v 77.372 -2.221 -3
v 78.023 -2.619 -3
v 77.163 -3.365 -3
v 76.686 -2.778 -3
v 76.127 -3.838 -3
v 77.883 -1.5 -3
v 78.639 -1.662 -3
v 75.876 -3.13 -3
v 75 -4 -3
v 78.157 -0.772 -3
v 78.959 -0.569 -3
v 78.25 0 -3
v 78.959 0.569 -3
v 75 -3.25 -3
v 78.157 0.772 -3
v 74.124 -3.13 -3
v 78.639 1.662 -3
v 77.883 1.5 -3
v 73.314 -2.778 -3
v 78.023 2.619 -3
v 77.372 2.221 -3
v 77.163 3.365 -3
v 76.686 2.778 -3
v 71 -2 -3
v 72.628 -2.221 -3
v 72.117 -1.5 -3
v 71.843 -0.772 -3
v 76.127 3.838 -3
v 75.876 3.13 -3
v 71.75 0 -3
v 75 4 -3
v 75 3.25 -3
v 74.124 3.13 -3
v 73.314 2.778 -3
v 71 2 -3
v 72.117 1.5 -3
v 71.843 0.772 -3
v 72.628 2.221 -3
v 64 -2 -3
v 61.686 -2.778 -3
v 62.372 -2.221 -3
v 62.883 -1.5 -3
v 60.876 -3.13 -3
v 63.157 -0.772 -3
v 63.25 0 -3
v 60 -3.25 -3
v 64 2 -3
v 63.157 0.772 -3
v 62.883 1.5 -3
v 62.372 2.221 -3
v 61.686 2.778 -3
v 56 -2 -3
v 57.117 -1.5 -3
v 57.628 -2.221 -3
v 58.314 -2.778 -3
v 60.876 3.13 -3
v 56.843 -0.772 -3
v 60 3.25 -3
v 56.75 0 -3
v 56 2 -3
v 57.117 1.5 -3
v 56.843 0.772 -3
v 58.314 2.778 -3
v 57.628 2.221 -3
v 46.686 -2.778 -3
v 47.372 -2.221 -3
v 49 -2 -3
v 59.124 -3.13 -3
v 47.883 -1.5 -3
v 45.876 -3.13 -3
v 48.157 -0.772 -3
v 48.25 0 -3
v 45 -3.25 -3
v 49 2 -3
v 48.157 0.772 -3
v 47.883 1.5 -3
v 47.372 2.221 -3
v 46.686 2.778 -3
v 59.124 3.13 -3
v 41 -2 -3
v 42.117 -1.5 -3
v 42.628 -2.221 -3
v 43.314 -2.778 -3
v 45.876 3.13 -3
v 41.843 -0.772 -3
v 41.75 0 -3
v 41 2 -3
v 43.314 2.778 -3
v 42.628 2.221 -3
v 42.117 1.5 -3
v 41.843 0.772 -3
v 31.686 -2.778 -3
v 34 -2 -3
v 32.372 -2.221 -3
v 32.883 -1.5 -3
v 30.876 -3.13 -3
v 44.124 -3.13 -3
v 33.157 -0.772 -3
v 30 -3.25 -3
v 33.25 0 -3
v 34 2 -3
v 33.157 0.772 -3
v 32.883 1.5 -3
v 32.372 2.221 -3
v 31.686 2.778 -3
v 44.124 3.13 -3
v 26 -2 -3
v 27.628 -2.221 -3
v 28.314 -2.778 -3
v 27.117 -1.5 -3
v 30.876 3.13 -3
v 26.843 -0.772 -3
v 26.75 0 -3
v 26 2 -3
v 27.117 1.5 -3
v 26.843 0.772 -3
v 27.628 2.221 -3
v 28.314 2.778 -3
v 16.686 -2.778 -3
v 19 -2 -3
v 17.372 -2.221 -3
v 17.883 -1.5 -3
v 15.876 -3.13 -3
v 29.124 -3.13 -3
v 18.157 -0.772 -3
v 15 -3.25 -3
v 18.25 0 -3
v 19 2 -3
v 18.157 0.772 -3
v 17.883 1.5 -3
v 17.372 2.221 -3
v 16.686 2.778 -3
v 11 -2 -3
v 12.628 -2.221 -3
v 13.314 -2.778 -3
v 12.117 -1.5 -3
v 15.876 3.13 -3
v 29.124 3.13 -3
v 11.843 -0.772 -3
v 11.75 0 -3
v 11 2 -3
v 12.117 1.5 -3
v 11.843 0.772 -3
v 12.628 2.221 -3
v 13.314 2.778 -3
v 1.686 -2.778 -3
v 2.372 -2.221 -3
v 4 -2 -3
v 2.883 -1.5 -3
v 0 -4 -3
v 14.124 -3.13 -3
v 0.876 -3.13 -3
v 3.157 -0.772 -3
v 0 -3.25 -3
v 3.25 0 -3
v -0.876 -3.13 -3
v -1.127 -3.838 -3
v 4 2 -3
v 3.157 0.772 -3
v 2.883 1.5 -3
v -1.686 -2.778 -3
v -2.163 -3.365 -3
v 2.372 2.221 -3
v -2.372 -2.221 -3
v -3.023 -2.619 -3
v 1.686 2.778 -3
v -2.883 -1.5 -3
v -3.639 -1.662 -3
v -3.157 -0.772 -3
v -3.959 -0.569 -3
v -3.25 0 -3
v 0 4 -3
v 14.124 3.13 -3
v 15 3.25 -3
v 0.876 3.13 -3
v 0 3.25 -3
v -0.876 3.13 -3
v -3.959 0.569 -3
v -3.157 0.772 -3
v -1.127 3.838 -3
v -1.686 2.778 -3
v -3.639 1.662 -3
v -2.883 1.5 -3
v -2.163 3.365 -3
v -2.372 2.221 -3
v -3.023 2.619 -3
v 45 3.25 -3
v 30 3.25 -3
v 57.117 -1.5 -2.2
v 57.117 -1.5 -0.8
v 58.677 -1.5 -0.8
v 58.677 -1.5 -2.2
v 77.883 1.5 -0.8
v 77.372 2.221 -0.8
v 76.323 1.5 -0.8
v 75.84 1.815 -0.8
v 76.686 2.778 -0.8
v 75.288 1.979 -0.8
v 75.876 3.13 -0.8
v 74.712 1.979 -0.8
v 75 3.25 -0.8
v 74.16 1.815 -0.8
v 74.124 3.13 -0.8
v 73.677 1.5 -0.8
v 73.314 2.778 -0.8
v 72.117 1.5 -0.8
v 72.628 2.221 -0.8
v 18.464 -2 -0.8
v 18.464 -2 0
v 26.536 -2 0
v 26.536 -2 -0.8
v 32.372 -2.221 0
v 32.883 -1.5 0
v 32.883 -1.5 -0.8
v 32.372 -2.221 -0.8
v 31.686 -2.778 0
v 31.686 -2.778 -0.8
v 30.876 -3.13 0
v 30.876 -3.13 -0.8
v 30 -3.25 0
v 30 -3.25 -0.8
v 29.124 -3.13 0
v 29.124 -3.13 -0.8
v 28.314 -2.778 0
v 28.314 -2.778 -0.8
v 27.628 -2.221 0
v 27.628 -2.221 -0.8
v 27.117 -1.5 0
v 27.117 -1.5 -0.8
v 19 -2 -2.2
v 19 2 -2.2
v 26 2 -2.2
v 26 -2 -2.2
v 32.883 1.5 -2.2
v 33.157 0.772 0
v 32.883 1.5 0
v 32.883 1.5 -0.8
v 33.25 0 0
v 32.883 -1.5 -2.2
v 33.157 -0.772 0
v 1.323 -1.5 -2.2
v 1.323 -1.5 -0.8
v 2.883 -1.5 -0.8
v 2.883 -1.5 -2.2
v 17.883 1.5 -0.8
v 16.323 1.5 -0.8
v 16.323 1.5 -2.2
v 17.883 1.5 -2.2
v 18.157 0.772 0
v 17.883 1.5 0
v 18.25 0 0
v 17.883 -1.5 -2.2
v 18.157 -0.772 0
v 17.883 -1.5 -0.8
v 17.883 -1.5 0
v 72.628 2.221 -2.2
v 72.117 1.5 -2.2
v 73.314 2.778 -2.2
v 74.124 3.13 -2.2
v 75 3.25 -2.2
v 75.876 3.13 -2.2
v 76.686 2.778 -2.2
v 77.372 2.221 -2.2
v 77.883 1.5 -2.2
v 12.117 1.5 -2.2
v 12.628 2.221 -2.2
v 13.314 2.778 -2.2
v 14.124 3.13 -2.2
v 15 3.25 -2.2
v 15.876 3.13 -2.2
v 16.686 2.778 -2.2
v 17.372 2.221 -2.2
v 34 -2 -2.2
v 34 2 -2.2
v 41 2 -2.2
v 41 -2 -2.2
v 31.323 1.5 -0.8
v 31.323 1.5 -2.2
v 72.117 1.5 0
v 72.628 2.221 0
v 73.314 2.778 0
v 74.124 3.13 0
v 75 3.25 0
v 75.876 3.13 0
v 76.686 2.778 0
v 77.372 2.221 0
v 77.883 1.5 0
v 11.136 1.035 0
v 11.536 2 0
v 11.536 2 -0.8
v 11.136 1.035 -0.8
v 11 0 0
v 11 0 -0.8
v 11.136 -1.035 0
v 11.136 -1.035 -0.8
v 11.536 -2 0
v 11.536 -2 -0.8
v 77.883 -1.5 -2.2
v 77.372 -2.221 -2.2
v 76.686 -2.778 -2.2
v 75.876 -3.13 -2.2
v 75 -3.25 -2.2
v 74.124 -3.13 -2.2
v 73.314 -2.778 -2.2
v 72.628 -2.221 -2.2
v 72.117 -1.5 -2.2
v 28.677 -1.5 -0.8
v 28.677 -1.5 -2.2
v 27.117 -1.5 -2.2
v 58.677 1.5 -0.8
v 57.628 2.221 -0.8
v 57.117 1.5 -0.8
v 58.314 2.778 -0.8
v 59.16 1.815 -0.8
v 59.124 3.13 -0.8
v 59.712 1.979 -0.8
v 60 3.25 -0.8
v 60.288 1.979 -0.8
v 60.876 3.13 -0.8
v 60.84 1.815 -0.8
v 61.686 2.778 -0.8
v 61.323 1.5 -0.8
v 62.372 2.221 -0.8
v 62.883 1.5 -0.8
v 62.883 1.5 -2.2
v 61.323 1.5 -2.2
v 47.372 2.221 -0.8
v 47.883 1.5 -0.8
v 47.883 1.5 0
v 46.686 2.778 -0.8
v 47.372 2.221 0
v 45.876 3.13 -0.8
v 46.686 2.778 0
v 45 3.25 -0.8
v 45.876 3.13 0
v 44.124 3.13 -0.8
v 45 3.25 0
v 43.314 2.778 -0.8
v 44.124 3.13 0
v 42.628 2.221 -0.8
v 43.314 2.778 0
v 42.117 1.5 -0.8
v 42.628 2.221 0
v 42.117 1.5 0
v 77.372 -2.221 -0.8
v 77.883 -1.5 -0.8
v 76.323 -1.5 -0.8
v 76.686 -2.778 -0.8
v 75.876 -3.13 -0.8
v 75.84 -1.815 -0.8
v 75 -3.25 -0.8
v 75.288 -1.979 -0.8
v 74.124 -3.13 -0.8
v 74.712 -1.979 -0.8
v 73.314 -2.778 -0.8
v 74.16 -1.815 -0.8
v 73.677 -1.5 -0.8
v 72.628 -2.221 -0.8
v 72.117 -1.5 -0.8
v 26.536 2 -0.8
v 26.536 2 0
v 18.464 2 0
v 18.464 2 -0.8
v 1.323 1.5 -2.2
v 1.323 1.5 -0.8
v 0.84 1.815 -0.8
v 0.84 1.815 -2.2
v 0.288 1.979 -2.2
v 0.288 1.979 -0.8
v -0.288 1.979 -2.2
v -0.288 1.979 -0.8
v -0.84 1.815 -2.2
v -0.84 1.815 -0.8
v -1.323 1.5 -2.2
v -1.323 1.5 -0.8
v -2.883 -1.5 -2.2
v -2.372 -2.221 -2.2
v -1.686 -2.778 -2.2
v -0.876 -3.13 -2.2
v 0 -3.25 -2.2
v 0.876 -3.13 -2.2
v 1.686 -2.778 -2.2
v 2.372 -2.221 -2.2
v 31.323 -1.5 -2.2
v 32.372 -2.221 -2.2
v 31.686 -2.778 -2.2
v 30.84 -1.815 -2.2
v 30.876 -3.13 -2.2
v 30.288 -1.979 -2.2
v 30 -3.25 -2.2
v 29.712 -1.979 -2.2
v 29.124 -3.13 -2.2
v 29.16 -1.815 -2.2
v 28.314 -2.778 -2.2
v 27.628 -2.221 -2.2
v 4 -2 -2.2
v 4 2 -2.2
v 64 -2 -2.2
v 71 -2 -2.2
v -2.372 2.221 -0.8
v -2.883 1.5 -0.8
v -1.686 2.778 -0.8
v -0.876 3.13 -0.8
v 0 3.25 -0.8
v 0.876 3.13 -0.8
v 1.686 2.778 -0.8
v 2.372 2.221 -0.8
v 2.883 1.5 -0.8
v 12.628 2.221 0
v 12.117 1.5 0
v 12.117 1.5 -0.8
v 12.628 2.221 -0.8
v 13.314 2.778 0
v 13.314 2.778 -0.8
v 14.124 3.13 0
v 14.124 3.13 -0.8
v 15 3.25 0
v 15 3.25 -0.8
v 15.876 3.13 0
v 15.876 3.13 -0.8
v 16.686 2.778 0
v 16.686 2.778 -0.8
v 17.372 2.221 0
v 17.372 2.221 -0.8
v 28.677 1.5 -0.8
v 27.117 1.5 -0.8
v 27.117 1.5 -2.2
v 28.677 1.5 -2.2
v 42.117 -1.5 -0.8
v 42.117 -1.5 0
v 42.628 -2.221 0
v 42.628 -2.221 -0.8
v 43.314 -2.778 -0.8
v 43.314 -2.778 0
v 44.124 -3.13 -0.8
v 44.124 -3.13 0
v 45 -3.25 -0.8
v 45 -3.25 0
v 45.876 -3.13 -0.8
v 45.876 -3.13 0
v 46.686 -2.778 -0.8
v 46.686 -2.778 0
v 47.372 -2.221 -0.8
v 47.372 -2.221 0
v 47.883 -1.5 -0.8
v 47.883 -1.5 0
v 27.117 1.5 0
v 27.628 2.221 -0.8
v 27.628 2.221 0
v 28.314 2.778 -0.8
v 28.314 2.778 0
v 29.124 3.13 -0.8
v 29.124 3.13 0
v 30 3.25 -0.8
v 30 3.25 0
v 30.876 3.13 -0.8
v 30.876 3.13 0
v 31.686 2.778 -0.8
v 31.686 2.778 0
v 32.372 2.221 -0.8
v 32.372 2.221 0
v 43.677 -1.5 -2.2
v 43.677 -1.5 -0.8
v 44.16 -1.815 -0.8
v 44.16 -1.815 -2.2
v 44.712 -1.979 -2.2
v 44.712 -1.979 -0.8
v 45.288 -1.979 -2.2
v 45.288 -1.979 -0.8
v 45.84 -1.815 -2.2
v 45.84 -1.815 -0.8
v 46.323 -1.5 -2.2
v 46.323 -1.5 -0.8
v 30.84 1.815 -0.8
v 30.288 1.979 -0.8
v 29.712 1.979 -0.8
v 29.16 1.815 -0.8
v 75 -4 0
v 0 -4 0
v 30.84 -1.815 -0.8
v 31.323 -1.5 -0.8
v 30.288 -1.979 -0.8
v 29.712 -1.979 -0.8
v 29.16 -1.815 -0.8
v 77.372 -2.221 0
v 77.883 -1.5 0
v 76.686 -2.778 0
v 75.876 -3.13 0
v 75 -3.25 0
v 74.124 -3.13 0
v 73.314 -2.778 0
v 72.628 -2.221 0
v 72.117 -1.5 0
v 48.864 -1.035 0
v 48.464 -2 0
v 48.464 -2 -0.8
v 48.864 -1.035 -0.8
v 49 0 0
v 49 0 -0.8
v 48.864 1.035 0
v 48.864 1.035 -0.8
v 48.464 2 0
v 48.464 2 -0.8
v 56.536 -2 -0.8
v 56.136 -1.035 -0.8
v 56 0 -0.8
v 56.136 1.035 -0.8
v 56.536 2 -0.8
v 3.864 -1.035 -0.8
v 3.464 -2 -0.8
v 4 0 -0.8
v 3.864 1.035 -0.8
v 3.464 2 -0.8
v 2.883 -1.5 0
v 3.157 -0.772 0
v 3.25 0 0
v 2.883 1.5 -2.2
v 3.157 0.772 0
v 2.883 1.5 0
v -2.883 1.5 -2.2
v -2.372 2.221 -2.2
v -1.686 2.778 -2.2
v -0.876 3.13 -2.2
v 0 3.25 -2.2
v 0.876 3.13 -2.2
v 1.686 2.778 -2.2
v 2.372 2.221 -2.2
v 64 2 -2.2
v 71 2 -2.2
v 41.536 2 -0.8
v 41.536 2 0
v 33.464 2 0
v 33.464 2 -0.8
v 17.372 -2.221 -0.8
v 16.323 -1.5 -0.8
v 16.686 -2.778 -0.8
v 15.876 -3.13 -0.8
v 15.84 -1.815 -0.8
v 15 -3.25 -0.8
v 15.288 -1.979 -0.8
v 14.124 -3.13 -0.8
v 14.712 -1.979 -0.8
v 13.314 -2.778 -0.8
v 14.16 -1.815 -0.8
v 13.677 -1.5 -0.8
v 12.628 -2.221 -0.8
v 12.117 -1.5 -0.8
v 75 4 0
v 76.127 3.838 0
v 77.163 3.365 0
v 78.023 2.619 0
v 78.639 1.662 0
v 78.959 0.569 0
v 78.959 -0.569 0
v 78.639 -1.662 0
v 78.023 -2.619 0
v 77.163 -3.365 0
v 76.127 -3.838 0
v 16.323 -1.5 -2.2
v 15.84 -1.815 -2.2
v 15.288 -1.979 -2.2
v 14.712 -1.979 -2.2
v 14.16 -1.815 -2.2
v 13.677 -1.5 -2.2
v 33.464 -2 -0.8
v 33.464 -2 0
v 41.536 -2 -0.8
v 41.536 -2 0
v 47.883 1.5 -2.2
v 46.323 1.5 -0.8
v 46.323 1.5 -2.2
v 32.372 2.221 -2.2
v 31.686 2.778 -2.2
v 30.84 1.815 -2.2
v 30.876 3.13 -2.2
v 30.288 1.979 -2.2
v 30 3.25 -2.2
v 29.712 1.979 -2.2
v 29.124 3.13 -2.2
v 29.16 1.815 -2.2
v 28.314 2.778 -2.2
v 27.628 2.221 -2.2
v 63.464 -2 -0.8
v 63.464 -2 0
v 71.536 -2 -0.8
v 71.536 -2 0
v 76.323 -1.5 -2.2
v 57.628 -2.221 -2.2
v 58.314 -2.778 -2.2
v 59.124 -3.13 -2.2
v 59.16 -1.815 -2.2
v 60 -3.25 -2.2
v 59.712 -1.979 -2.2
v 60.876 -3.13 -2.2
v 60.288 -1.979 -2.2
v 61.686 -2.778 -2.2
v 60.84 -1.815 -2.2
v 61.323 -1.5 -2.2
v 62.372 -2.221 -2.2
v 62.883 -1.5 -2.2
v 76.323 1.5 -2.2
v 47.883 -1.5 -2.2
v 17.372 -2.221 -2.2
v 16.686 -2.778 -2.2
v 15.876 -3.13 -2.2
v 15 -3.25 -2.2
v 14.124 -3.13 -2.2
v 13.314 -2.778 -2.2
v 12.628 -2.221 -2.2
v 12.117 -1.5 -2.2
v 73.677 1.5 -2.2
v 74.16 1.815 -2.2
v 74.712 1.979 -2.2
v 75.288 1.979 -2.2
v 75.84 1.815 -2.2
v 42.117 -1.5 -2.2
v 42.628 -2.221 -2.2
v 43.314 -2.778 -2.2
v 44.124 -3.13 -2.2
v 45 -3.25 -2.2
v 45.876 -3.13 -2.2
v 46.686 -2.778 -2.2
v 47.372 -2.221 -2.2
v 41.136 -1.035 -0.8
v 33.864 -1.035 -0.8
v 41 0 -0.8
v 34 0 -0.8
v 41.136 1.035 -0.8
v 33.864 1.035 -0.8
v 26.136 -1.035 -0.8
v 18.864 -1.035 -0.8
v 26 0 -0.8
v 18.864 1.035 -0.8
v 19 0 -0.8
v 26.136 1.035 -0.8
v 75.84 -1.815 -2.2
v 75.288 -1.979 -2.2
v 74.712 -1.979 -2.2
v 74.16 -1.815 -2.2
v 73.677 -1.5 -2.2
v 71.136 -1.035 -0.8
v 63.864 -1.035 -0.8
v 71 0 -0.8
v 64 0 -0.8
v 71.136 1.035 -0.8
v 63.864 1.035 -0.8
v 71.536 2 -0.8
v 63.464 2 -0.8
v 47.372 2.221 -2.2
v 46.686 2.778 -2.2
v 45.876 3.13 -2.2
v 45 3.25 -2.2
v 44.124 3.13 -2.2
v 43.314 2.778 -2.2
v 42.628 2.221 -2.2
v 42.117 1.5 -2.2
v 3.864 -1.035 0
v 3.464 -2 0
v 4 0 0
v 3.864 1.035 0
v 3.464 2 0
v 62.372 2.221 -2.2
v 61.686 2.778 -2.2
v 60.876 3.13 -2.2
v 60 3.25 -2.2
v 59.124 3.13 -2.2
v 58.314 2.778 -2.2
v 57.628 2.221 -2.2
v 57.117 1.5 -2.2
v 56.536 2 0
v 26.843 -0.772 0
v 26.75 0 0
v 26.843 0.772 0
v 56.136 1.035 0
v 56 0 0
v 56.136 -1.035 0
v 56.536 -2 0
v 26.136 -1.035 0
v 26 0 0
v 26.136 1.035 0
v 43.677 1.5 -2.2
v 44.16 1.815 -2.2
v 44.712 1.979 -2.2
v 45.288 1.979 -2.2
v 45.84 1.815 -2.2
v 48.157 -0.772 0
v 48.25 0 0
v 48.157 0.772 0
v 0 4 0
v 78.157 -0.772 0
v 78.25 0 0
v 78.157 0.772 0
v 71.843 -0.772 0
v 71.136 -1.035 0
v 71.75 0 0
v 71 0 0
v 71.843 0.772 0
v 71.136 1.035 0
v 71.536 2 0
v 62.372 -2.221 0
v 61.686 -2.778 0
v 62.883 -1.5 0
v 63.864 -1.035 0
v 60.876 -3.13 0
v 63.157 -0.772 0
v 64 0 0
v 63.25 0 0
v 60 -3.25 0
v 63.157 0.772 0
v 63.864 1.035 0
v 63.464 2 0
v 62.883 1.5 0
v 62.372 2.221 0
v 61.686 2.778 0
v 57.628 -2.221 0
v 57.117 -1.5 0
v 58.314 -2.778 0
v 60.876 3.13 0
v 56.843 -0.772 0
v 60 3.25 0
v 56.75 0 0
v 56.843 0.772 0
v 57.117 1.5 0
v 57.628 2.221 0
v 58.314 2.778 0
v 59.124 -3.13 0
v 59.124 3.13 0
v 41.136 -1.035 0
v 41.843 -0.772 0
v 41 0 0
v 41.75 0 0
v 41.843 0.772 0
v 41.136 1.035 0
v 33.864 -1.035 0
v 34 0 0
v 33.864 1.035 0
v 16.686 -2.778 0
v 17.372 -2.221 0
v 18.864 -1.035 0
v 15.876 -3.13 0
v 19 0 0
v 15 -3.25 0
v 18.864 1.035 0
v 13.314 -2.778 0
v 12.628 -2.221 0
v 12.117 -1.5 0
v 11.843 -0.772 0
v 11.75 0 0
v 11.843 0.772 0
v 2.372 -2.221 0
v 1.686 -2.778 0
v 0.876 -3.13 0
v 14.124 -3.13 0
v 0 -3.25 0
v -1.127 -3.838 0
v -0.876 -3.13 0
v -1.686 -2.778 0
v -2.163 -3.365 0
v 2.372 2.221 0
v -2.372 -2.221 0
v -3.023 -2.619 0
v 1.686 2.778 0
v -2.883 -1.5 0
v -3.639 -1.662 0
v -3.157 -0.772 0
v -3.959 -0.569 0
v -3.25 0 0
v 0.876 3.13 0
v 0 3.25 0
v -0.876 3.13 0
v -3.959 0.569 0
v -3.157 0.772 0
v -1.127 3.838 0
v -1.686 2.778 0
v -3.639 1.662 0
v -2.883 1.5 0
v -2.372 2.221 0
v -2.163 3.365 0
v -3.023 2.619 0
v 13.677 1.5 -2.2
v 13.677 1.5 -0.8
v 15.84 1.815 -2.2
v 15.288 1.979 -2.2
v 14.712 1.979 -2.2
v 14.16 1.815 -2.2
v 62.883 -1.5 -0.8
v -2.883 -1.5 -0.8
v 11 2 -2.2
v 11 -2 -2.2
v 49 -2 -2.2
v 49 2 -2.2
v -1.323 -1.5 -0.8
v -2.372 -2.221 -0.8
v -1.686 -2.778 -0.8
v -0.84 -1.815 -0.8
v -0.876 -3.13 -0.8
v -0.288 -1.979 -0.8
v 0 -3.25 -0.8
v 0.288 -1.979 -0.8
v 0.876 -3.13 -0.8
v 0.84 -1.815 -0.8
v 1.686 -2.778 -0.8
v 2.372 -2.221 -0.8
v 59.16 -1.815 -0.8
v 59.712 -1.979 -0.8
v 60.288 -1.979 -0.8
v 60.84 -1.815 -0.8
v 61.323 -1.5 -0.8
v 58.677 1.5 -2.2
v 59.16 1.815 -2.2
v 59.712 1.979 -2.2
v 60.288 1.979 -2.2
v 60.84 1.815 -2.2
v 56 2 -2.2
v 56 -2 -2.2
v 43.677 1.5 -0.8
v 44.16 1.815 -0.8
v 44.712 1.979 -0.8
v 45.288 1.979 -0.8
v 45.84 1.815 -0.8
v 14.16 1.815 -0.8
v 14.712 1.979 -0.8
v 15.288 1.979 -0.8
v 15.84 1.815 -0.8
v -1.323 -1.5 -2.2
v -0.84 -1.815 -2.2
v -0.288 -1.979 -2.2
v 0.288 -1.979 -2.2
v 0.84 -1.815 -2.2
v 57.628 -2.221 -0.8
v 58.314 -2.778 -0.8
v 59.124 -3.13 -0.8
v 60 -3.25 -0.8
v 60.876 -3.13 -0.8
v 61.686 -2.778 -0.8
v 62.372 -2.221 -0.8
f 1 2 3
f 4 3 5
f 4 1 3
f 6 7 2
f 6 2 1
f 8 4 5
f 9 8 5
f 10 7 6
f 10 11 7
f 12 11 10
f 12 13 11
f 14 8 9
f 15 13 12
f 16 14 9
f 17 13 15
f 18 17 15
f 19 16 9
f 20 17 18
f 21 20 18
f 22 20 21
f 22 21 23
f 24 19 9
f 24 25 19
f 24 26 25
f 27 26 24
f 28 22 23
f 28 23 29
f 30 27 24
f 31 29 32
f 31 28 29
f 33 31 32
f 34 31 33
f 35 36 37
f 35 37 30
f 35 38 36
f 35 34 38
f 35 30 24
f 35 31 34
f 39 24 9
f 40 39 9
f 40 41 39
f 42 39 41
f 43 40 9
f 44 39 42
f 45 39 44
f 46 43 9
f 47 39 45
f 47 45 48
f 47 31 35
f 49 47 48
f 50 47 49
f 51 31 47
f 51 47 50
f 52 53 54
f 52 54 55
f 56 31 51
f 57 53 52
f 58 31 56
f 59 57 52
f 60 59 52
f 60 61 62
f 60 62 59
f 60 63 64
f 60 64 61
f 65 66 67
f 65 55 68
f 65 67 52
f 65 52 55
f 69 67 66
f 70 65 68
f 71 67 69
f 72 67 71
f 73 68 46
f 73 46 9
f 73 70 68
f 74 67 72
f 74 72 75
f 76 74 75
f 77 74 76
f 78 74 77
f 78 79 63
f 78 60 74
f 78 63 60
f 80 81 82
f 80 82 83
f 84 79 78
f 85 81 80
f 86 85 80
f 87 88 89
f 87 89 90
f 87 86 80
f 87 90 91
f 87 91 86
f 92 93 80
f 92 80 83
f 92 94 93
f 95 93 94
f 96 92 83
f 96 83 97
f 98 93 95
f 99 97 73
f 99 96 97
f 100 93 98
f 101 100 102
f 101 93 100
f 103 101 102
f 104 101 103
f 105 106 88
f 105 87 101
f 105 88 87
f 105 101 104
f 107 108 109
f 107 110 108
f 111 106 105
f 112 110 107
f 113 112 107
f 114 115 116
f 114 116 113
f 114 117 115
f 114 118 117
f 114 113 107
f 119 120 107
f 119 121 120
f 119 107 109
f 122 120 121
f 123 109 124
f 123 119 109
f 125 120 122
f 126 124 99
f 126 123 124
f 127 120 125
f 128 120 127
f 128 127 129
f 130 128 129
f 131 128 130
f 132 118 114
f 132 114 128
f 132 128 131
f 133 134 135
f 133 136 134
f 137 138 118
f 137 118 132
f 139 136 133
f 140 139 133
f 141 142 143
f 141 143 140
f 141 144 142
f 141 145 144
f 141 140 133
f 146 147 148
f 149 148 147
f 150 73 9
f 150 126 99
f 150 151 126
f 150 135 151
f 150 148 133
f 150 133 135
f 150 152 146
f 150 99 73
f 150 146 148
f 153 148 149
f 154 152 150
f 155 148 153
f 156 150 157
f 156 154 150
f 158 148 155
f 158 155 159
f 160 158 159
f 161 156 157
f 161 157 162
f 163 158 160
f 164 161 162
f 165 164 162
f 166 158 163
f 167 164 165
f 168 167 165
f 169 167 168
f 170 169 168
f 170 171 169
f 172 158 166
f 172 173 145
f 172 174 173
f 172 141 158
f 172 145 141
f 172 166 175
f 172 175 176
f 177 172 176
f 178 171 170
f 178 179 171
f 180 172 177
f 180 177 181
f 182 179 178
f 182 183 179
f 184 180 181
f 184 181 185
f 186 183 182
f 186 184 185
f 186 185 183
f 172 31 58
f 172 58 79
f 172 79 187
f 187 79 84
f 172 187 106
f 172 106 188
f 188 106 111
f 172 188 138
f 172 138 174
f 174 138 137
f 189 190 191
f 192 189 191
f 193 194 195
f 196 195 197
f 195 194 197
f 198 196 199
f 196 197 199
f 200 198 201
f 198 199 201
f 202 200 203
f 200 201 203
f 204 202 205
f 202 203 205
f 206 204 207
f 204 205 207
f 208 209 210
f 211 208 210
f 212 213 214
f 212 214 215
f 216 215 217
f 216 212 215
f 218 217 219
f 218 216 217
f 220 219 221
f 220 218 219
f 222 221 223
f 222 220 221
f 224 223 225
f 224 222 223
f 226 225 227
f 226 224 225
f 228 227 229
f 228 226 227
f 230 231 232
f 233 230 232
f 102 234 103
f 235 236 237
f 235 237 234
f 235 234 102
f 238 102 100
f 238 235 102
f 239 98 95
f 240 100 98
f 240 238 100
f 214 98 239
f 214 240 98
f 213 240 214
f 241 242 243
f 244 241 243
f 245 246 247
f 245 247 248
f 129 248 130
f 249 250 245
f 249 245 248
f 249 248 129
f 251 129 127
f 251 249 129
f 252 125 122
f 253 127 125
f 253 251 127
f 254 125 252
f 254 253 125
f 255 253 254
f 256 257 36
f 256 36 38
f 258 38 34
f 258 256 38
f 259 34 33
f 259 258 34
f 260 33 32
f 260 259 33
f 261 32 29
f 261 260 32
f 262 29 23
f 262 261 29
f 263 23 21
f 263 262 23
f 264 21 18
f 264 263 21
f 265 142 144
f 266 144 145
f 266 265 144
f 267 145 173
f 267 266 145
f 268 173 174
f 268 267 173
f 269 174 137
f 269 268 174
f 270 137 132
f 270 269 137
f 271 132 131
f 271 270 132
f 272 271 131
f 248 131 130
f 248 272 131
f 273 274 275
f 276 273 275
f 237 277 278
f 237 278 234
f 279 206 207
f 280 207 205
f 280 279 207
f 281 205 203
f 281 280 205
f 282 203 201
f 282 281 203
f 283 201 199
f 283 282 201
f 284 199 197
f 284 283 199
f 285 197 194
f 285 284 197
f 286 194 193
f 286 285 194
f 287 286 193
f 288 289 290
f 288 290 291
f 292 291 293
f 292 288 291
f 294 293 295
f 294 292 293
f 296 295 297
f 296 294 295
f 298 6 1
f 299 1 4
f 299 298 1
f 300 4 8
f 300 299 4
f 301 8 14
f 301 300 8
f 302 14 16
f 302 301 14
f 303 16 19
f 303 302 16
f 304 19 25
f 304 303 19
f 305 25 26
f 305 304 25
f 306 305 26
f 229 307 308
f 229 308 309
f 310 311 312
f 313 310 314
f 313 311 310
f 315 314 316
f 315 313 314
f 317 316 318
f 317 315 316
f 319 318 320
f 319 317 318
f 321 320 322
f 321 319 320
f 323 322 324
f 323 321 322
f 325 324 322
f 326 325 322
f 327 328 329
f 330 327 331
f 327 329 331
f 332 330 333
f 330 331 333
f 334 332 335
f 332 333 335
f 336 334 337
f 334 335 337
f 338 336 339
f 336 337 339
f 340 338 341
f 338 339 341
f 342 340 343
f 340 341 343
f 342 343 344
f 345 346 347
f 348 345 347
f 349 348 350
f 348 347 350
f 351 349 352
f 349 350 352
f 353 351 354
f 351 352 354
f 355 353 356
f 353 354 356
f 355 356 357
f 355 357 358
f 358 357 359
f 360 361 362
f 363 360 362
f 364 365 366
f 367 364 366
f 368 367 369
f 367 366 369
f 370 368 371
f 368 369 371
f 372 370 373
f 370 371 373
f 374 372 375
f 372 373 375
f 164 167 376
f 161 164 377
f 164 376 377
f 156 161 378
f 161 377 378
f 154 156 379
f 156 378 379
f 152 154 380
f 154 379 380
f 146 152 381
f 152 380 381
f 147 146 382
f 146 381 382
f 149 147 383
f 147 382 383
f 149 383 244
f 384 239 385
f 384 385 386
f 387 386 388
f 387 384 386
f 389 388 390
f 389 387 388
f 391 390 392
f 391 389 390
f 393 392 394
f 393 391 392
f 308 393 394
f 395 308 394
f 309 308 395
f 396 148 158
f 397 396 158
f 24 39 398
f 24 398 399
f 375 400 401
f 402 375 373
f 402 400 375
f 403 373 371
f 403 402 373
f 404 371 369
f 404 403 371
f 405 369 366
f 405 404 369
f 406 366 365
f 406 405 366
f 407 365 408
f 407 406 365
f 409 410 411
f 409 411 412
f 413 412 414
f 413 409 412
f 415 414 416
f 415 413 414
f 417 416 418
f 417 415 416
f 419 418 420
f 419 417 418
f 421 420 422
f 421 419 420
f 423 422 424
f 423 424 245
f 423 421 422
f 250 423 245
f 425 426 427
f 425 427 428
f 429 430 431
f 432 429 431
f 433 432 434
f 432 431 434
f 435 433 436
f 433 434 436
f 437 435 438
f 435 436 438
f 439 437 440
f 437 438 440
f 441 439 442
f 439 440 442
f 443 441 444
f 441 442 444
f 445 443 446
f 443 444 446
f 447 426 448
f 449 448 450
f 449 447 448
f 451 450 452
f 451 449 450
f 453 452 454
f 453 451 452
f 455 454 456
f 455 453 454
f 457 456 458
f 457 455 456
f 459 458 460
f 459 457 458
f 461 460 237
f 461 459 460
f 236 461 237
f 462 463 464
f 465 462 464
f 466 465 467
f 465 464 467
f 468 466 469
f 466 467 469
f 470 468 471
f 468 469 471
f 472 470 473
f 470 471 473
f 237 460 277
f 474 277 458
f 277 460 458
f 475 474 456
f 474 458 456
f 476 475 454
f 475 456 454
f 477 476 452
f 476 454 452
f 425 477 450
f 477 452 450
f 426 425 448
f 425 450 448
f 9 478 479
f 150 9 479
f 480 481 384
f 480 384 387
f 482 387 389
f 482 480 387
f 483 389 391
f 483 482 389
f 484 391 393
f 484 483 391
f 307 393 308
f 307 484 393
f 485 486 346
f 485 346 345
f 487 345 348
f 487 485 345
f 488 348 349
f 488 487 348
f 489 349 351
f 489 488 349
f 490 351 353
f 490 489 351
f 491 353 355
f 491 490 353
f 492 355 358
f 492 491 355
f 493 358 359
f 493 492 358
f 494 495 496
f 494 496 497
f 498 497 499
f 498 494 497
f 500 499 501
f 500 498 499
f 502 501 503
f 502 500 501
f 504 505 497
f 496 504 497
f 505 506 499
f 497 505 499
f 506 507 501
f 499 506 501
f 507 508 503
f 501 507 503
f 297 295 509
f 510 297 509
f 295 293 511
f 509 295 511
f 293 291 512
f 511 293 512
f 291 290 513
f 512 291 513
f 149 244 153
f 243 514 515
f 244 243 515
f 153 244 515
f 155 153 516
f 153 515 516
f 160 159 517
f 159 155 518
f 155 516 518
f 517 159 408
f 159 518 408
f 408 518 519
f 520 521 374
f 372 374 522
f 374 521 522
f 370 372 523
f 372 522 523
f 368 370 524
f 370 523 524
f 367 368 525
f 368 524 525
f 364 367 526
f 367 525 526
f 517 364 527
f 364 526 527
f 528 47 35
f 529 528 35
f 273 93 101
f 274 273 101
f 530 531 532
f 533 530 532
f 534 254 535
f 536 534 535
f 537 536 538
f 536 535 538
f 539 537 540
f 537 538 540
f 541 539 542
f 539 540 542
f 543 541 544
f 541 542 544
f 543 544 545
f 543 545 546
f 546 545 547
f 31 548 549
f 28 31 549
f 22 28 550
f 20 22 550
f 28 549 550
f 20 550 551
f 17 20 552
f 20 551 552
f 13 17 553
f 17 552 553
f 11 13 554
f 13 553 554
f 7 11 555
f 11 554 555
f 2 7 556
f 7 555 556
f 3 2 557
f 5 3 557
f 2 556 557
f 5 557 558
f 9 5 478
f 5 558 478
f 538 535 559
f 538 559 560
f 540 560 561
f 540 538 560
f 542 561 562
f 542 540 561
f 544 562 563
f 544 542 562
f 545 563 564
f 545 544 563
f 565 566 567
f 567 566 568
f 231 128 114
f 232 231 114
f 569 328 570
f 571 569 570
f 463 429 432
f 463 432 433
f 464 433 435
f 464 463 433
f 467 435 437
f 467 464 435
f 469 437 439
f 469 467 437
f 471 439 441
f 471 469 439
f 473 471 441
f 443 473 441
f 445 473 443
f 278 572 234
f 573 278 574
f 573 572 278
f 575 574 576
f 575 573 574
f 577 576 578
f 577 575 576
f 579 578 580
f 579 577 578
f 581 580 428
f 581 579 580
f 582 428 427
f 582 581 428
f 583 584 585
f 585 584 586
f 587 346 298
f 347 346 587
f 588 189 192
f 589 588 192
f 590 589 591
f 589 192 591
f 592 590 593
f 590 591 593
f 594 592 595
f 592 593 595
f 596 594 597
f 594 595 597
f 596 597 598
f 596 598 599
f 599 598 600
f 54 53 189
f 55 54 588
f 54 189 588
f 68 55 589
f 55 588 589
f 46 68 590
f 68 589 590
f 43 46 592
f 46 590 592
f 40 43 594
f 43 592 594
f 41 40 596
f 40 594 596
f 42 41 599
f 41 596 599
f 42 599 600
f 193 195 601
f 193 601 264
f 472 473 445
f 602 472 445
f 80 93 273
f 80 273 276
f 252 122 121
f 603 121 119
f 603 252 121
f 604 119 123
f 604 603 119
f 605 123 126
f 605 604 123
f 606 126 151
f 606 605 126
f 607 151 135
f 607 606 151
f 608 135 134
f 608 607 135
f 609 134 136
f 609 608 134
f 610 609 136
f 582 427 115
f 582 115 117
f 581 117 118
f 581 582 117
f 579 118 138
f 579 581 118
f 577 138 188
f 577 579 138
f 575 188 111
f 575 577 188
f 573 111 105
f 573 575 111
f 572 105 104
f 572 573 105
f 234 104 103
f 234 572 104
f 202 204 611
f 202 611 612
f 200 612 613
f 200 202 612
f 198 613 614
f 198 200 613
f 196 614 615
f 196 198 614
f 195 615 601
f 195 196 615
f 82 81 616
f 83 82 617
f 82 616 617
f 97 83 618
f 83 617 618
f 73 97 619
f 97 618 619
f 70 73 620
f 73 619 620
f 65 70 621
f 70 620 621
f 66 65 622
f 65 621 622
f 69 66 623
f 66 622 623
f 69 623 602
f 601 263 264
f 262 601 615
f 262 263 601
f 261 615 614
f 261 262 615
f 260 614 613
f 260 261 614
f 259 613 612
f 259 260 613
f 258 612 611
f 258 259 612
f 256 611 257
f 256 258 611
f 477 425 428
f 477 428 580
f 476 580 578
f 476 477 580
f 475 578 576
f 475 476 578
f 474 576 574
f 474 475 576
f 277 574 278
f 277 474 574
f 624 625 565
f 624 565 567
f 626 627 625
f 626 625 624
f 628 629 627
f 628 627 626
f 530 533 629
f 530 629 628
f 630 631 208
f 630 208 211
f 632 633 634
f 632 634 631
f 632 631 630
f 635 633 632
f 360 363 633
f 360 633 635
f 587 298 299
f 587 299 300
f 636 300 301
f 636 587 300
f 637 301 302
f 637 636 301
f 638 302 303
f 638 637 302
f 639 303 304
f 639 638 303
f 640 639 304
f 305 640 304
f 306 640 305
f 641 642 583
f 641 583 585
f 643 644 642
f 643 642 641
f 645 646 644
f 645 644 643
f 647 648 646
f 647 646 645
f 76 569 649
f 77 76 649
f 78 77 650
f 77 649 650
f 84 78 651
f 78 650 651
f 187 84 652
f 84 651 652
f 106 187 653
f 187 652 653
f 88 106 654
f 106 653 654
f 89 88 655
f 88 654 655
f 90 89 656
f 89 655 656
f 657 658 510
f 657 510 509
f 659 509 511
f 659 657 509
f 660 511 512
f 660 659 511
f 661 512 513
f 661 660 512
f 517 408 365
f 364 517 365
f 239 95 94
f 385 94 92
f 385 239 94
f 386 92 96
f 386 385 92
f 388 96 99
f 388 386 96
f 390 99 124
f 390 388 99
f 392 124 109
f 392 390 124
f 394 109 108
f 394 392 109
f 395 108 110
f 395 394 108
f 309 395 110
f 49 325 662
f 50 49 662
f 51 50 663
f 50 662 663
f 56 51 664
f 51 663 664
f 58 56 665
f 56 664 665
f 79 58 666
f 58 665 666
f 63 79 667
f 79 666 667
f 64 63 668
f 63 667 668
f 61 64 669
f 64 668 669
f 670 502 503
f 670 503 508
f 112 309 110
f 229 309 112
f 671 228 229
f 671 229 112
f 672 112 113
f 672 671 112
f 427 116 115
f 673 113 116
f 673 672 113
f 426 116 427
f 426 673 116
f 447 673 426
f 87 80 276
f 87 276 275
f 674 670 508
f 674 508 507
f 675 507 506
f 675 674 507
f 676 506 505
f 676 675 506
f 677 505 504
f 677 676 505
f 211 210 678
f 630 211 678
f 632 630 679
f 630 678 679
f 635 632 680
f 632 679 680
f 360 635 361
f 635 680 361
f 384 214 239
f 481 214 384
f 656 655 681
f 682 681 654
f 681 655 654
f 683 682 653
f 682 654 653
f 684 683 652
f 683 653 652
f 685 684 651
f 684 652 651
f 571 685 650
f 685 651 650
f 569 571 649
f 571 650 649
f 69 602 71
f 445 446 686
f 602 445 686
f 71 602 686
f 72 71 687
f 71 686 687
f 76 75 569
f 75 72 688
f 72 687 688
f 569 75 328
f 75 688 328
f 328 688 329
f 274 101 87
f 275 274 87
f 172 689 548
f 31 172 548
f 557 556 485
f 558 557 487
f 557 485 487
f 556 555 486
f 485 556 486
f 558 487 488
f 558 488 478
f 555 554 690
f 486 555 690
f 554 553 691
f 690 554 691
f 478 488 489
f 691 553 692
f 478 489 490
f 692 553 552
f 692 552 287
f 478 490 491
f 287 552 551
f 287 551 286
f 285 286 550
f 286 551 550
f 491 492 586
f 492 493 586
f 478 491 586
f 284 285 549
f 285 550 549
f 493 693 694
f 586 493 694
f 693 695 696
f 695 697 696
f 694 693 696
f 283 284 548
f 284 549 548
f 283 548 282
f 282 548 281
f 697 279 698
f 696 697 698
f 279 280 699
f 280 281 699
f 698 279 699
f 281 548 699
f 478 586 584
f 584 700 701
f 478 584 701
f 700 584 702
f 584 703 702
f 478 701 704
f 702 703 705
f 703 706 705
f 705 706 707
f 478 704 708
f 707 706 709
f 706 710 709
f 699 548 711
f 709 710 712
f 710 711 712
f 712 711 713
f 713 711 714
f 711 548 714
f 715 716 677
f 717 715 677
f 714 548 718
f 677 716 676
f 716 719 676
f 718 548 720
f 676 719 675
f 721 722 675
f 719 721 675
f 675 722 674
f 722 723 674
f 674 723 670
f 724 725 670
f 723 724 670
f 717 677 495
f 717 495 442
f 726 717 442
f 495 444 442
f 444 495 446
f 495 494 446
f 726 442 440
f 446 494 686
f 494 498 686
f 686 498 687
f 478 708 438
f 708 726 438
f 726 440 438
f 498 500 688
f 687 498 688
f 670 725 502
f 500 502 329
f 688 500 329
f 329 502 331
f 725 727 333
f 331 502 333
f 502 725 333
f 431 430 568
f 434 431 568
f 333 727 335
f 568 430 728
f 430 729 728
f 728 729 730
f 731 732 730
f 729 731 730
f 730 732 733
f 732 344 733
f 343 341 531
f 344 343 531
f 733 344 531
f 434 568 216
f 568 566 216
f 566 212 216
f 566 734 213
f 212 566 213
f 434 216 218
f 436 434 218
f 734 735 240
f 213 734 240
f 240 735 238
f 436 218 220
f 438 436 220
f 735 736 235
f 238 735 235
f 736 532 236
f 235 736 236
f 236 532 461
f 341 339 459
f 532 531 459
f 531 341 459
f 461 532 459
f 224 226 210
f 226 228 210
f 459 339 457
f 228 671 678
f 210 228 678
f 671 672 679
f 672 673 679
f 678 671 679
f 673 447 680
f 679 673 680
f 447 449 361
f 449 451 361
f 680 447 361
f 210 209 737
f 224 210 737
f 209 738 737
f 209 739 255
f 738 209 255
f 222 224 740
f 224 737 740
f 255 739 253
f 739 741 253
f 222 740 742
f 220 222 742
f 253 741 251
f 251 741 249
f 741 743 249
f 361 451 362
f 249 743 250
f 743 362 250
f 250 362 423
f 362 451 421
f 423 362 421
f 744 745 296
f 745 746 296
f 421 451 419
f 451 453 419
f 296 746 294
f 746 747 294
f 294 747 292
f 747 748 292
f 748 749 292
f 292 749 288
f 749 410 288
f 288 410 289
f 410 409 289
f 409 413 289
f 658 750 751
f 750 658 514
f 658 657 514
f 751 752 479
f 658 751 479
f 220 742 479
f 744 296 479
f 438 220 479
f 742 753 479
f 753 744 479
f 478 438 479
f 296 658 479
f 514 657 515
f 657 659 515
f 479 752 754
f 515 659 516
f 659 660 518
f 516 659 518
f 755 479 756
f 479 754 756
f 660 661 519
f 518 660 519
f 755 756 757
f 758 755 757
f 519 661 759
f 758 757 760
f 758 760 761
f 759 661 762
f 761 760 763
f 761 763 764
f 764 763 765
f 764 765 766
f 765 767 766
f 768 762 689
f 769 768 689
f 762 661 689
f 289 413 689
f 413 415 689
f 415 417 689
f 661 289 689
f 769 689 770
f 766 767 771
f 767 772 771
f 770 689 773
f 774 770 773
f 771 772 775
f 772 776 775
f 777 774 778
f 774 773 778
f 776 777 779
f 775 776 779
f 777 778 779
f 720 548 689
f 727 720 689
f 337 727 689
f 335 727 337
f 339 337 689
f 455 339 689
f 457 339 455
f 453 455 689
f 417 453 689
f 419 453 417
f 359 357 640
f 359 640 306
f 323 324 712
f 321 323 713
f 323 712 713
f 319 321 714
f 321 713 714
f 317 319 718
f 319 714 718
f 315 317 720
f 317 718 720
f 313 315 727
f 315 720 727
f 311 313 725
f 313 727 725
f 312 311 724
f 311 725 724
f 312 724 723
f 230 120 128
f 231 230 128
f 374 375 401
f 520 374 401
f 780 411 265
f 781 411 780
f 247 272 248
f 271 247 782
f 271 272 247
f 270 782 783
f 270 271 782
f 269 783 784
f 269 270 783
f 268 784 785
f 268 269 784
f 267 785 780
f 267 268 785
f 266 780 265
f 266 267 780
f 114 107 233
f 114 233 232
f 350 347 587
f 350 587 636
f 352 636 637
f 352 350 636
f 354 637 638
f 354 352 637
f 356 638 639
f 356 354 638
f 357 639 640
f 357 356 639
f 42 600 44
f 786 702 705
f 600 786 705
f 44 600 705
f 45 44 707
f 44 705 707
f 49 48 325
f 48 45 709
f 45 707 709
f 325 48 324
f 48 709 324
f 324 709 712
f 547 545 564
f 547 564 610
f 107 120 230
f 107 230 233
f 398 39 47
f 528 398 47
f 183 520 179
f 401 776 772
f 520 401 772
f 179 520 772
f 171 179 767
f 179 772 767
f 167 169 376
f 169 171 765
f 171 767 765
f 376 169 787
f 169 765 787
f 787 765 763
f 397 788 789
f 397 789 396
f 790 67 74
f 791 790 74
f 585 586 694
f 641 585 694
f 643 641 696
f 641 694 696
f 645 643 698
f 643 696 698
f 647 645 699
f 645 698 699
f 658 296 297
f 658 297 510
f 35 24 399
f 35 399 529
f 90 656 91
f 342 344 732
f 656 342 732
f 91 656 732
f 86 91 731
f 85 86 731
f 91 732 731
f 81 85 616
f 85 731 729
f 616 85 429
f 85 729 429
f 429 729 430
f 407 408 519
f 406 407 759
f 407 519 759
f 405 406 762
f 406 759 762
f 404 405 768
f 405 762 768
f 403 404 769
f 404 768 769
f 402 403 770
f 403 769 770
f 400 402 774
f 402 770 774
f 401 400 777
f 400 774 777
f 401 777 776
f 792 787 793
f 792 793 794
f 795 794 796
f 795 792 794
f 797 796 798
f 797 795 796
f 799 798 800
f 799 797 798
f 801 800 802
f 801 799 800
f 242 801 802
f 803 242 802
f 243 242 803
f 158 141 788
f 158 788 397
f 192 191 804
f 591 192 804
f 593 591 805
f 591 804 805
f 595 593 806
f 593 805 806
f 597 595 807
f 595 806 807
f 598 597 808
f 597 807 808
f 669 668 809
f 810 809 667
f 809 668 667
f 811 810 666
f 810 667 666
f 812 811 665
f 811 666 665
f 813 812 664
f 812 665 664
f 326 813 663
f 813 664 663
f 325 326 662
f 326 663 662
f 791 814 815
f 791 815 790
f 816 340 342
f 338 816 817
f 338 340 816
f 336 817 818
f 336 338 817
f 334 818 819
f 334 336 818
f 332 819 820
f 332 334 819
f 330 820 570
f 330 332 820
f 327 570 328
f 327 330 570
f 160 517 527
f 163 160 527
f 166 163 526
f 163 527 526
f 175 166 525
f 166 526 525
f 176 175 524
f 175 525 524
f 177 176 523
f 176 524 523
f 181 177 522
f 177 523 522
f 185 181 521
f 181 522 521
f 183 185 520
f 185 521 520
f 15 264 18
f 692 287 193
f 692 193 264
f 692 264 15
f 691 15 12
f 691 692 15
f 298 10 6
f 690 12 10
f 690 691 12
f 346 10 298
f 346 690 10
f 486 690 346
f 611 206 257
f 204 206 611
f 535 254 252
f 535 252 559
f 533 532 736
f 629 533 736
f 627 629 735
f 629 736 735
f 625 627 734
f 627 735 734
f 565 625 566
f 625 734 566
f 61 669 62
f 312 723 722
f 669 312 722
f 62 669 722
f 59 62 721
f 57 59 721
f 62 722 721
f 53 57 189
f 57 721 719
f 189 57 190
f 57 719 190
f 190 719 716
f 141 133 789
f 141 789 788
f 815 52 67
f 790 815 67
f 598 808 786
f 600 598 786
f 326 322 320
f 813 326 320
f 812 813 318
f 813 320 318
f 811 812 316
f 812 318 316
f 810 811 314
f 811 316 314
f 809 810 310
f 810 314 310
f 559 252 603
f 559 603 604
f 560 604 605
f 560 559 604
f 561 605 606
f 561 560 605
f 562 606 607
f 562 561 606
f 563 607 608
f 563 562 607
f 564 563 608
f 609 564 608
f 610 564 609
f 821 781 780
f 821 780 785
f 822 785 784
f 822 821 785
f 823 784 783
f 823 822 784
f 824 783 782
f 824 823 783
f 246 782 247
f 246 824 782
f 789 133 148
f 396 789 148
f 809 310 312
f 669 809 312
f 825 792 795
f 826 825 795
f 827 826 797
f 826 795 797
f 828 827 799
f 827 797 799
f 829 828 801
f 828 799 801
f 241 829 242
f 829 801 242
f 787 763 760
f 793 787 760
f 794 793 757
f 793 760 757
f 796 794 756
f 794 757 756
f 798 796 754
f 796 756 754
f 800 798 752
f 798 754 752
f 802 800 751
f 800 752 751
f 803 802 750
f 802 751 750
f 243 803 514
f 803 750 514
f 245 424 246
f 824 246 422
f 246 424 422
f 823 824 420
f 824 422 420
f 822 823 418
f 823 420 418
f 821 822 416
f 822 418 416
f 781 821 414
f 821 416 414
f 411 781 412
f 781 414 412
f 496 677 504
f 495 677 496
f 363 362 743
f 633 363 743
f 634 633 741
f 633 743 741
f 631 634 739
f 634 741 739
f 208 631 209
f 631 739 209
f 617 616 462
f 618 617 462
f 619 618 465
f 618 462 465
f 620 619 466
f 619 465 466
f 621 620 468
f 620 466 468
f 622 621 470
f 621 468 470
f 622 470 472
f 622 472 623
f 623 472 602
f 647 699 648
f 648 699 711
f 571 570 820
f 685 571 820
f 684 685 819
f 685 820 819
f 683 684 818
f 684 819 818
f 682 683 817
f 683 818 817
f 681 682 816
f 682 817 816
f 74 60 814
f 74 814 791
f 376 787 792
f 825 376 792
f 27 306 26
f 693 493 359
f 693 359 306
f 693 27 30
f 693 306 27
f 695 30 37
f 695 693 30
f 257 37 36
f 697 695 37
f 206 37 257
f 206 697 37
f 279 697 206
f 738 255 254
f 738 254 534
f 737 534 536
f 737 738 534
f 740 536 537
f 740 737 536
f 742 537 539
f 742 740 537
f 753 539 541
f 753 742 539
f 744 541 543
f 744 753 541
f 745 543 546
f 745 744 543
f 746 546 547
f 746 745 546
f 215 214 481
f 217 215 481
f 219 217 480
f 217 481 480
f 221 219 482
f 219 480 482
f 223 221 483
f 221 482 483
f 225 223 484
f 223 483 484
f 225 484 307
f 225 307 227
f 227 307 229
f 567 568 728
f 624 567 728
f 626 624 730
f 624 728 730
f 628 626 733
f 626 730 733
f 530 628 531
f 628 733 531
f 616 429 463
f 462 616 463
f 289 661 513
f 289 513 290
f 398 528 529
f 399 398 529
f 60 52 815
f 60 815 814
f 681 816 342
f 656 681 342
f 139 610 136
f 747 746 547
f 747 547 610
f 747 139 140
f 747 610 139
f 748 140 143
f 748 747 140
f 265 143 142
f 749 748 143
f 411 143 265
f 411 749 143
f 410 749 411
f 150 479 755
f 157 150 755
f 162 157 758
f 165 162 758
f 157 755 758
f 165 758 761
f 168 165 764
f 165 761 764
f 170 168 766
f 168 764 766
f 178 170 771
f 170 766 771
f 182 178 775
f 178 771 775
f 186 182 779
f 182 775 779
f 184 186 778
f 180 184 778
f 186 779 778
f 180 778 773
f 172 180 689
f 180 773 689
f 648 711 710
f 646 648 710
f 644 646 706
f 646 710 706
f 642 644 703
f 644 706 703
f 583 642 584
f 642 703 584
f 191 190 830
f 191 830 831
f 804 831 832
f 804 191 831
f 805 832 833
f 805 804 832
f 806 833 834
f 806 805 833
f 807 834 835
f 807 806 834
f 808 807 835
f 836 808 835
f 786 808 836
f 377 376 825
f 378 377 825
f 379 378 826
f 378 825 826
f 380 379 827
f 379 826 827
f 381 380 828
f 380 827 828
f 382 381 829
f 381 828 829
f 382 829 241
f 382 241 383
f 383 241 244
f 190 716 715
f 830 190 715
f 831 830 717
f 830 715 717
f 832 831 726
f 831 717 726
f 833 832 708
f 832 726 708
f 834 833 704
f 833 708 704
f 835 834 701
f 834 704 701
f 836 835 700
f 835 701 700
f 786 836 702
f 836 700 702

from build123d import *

# Parameters (mm, degrees)
EXTRUDE_1_DEPTH          = 3
CUT_EXTRUDE_1_REACH      = 81.158
SKETCH_3_R               = 3.25
CUT_EXTRUDE_2_DEPTH      = 0.8
CUT_EXTRUDE_START        = -2.2
SKETCH_3_2_R             = 3.25
CUT_EXTRUDE_3_DEPTH      = 0.8
CUT_EXTRUDE_4_DEPTH      = 0.8
SKETCH_5_W               = 7
SKETCH_5_H               = 4
CUT_EXTRUDE_6_DEPTH      = 0.8
MIRROR_8_COPY_1_REACH    = 81.158
MIRROR_8_COPY_2_SKETCH_R = 3.25
MIRROR_8_COPY_2_DEPTH    = 0.8
MIRROR_START             = -2.2
MIRROR_8_COPY_3_SKETCH_R = 3.25
MIRROR_8_COPY_3_DEPTH    = 0.8
MIRROR_8_COPY_4_DEPTH    = 0.8
MIRROR_8_COPY_5_SKETCH_W = 7
MIRROR_8_COPY_5_SKETCH_H = 4
MIRROR_8_COPY_5_DEPTH    = 0.8
MIRROR_8_COPY_6_REACH    = 81.158
MIRROR_8_COPY_7_SKETCH_R = 3.25
MIRROR_8_COPY_7_DEPTH    = 0.8
MIRROR_8_COPY_8_SKETCH_R = 3.25
MIRROR_8_COPY_8_DEPTH    = 0.8


with BuildPart() as part:
    # 草图1 → 凸台-拉伸1 (new body)
    with BuildSketch(Plane.XY):
        with BuildLine():
            Line((0, 4), (75, 4))
            ThreePointArc((75, 4), (79, 0), (75, -4))
            Line((75, -4), (0, -4))
            ThreePointArc((0, -4), (-4, 0), (0, 4))
        make_face()
    extrude(amount=-EXTRUDE_1_DEPTH)

    # 草图2 → 切除-拉伸1 (cut, up to next)
    with BuildSketch(Plane.XY, mode=Mode.PRIVATE) as cut_extrude_1_sk1:
        with BuildLine():
            Line((1.322875656, -1.5), (2.883140649, -1.5))
            ThreePointArc((2.883140649, -1.5), (3.25, 0), (2.883140649, 1.5))
            Line((2.883140649, 1.5), (1.322875656, 1.5))
            ThreePointArc((1.322875656, 1.5), (0, 2), (-1.322875656, 1.5))
            Line((-1.322875656, 1.5), (-2.883140649, 1.5))
            ThreePointArc((-2.883140649, 1.5), (-3.25, 0), (-2.883140649, -1.5))
            Line((-2.883140649, -1.5), (-1.322875656, -1.5))
            ThreePointArc((-1.322875656, -1.5), (0, -2), (1.322875656, -1.5))
        make_face()
    cut_extrude_1_tool1 = extrude(cut_extrude_1_sk1.sketch, amount=-CUT_EXTRUDE_1_REACH, mode=Mode.PRIVATE) & part.part
    cut_extrude_1 = cut_extrude_1_tool1.solids().sort_by_distance((0, 0, 0))[0]
    add(cut_extrude_1, mode=Mode.SUBTRACT)

    # 草图3 → 切除-拉伸2 (cut)
    with BuildSketch(Plane.XY):
        Circle(SKETCH_3_R)
    cut_extrude_2 = extrude(amount=-CUT_EXTRUDE_2_DEPTH, mode=Mode.SUBTRACT)

    # 草图3<2> → 切除-拉伸3 (cut)
    with BuildSketch(Plane.XY.offset(CUT_EXTRUDE_START)):
        Circle(SKETCH_3_2_R)
    cut_extrude_3 = extrude(amount=-CUT_EXTRUDE_3_DEPTH, mode=Mode.SUBTRACT)

    # 草图4 → 切除-拉伸4 (cut)
    with BuildSketch(Plane.XY):
        with BuildLine():
            Line((3.464101615, 2), (11.535898385, 2))
            ThreePointArc((11.535898385, 2), (11, 0), (11.535898385, -2))
            Line((11.535898385, -2), (3.464101615, -2))
            ThreePointArc((3.464101615, -2), (4, 0), (3.464101615, 2))
        make_face()
    cut_extrude_4 = extrude(amount=-CUT_EXTRUDE_4_DEPTH, mode=Mode.SUBTRACT)

    # 草图5 → 切除-拉伸6 (cut)
    with BuildSketch(Plane(origin=(0, 0, -3), x_dir=(-1, 0, 0), z_dir=(0, 0, -1))):
        with Locations((-7.5, 0)):
            Rectangle(SKETCH_5_W, SKETCH_5_H)
    cut_extrude_6 = extrude(amount=-CUT_EXTRUDE_6_DEPTH, mode=Mode.SUBTRACT)

    # 镜向1: 切除-拉伸1, 切除-拉伸2, 切除-拉伸3 across plane
    add(cut_extrude_1.mirror(Plane(origin=(7.5, 0, 0), x_dir=(0, 0, 1), z_dir=(1, 0, 0))), mode=Mode.SUBTRACT)
    add(cut_extrude_2.mirror(Plane(origin=(7.5, 0, 0), x_dir=(0, 0, 1), z_dir=(1, 0, 0))), mode=Mode.SUBTRACT)
    add(cut_extrude_3.mirror(Plane(origin=(7.5, 0, 0), x_dir=(0, 0, 1), z_dir=(1, 0, 0))), mode=Mode.SUBTRACT)

    # 镜向3: 切除-拉伸4, 切除-拉伸6 across plane
    add(cut_extrude_4.mirror(Plane(origin=(15, 0, 0), x_dir=(0, 0, 1), z_dir=(1, 0, 0))), mode=Mode.SUBTRACT)
    add(cut_extrude_6.mirror(Plane(origin=(15, 0, 0), x_dir=(0, 0, 1), z_dir=(1, 0, 0))), mode=Mode.SUBTRACT)

    # 镜向4: 切除-拉伸4, 切除-拉伸6 across plane
    add(cut_extrude_4.mirror(Plane(origin=(22.5, 0, 0), x_dir=(0, 0, 1), z_dir=(1, 0, 0))), mode=Mode.SUBTRACT)
    add(cut_extrude_6.mirror(Plane(origin=(22.5, 0, 0), x_dir=(0, 0, 1), z_dir=(1, 0, 0))), mode=Mode.SUBTRACT)

    # 镜向7: 切除-拉伸1, 切除-拉伸2, 切除-拉伸3 across plane
    add(cut_extrude_1.mirror(Plane(origin=(15, 0, 0), x_dir=(0, 0, 1), z_dir=(1, 0, 0))), mode=Mode.SUBTRACT)
    add(cut_extrude_2.mirror(Plane(origin=(15, 0, 0), x_dir=(0, 0, 1), z_dir=(1, 0, 0))), mode=Mode.SUBTRACT)
    add(cut_extrude_3.mirror(Plane(origin=(15, 0, 0), x_dir=(0, 0, 1), z_dir=(1, 0, 0))), mode=Mode.SUBTRACT)

    # 镜向8: 切除-拉伸1, 切除-拉伸2, 切除-拉伸3, 切除-拉伸4, 切除-拉伸6 across plane
    add(cut_extrude_1.mirror(Plane(origin=(37.5, 0, 0), x_dir=(0, 0, 1), z_dir=(1, 0, 0))), mode=Mode.SUBTRACT)
    add(cut_extrude_2.mirror(Plane(origin=(37.5, 0, 0), x_dir=(0, 0, 1), z_dir=(1, 0, 0))), mode=Mode.SUBTRACT)
    add(cut_extrude_3.mirror(Plane(origin=(37.5, 0, 0), x_dir=(0, 0, 1), z_dir=(1, 0, 0))), mode=Mode.SUBTRACT)
    add(cut_extrude_4.mirror(Plane(origin=(37.5, 0, 0), x_dir=(0, 0, 1), z_dir=(1, 0, 0))), mode=Mode.SUBTRACT)
    add(cut_extrude_6.mirror(Plane(origin=(37.5, 0, 0), x_dir=(0, 0, 1), z_dir=(1, 0, 0))), mode=Mode.SUBTRACT)

    # 镜向8 copy 1 sketch → 镜向8 copy 1 (cut, up to next)
    with BuildSketch(Plane(origin=(60, 0, 0), x_dir=(1, 0, 0), z_dir=(0, 0, 1)), mode=Mode.PRIVATE) as mirror_8_copy_1_sk1:
        with BuildLine():
            Line((1.322875656, -1.5), (2.883140649, -1.5))
            ThreePointArc((2.883140649, -1.5), (3.25, 0), (2.883140649, 1.5))
            Line((2.883140649, 1.5), (1.322875656, 1.5))
            ThreePointArc((1.322875656, 1.5), (0, 2), (-1.322875656, 1.5))
            Line((-1.322875656, 1.5), (-2.883140649, 1.5))
            ThreePointArc((-2.883140649, 1.5), (-3.25, 0), (-2.883140649, -1.5))
            Line((-2.883140649, -1.5), (-1.322875656, -1.5))
            ThreePointArc((-1.322875656, -1.5), (0, -2), (1.322875656, -1.5))
        make_face()
    mirror_8_copy_1_tool1 = extrude(mirror_8_copy_1_sk1.sketch, amount=-MIRROR_8_COPY_1_REACH, mode=Mode.PRIVATE) & part.part
    add(mirror_8_copy_1_tool1.solids().sort_by_distance((60, 0, 0))[0], mode=Mode.SUBTRACT)

    # 镜向8 copy 2 sketch → 镜向8 copy 2 (cut)
    with BuildSketch(Plane(origin=(60, 0, 0), x_dir=(1, 0, 0), z_dir=(0, 0, 1))):
        Circle(MIRROR_8_COPY_2_SKETCH_R)
    extrude(amount=-MIRROR_8_COPY_2_DEPTH, mode=Mode.SUBTRACT)

    # 镜向8 copy 3 sketch → 镜向8 copy 3 (cut)
    with BuildSketch(Plane(origin=(60, 0, 0), x_dir=(1, 0, 0), z_dir=(0, 0, 1)).offset(MIRROR_START)):
        Circle(MIRROR_8_COPY_3_SKETCH_R)
    extrude(amount=-MIRROR_8_COPY_3_DEPTH, mode=Mode.SUBTRACT)

    # 镜向8 copy 4 sketch → 镜向8 copy 4 (cut)
    with BuildSketch(Plane(origin=(45, 0, 0), x_dir=(1, 0, 0), z_dir=(0, 0, 1))):
        with BuildLine():
            Line((3.464101615, 2), (11.535898385, 2))
            ThreePointArc((11.535898385, 2), (11, 0), (11.535898385, -2))
            Line((11.535898385, -2), (3.464101615, -2))
            ThreePointArc((3.464101615, -2), (4, 0), (3.464101615, 2))
        make_face()
    extrude(amount=-MIRROR_8_COPY_4_DEPTH, mode=Mode.SUBTRACT)

    # 镜向8 copy 5 sketch → 镜向8 copy 5 (cut)
    with BuildSketch(Plane(origin=(45, 0, -3), x_dir=(-1, 0, 0), z_dir=(0, 0, -1))):
        with Locations((-7.5, 0)):
            Rectangle(MIRROR_8_COPY_5_SKETCH_W, MIRROR_8_COPY_5_SKETCH_H)
    extrude(amount=-MIRROR_8_COPY_5_DEPTH, mode=Mode.SUBTRACT)

    # 镜向8 copy 6 sketch → 镜向8 copy 6 (cut, up to next)
    with BuildSketch(Plane(origin=(45, 0, 0), x_dir=(1, 0, 0), z_dir=(0, 0, 1)), mode=Mode.PRIVATE) as mirror_8_copy_6_sk1:
        with BuildLine():
            Line((1.322875656, -1.5), (2.883140649, -1.5))
            ThreePointArc((2.883140649, -1.5), (3.25, 0), (2.883140649, 1.5))
            Line((2.883140649, 1.5), (1.322875656, 1.5))
            ThreePointArc((1.322875656, 1.5), (0, 2), (-1.322875656, 1.5))
            Line((-1.322875656, 1.5), (-2.883140649, 1.5))
            ThreePointArc((-2.883140649, 1.5), (-3.25, 0), (-2.883140649, -1.5))
            Line((-2.883140649, -1.5), (-1.322875656, -1.5))
            ThreePointArc((-1.322875656, -1.5), (0, -2), (1.322875656, -1.5))
        make_face()
    mirror_8_copy_6_tool1 = extrude(mirror_8_copy_6_sk1.sketch, amount=-MIRROR_8_COPY_6_REACH, mode=Mode.PRIVATE) & part.part
    add(mirror_8_copy_6_tool1.solids().sort_by_distance((45, 0, 0))[0], mode=Mode.SUBTRACT)

    # 镜向8 copy 7 sketch → 镜向8 copy 7 (cut)
    with BuildSketch(Plane(origin=(45, 0, 0), x_dir=(1, 0, 0), z_dir=(0, 0, 1))):
        Circle(MIRROR_8_COPY_7_SKETCH_R)
    extrude(amount=-MIRROR_8_COPY_7_DEPTH, mode=Mode.SUBTRACT)

    # 镜向8 copy 8 sketch → 镜向8 copy 8 (cut)
    with BuildSketch(Plane(origin=(45, 0, 0), x_dir=(1, 0, 0), z_dir=(0, 0, 1)).offset(MIRROR_START)):
        Circle(MIRROR_8_COPY_8_SKETCH_R)
    extrude(amount=-MIRROR_8_COPY_8_DEPTH, mode=Mode.SUBTRACT)


solid = part.part
